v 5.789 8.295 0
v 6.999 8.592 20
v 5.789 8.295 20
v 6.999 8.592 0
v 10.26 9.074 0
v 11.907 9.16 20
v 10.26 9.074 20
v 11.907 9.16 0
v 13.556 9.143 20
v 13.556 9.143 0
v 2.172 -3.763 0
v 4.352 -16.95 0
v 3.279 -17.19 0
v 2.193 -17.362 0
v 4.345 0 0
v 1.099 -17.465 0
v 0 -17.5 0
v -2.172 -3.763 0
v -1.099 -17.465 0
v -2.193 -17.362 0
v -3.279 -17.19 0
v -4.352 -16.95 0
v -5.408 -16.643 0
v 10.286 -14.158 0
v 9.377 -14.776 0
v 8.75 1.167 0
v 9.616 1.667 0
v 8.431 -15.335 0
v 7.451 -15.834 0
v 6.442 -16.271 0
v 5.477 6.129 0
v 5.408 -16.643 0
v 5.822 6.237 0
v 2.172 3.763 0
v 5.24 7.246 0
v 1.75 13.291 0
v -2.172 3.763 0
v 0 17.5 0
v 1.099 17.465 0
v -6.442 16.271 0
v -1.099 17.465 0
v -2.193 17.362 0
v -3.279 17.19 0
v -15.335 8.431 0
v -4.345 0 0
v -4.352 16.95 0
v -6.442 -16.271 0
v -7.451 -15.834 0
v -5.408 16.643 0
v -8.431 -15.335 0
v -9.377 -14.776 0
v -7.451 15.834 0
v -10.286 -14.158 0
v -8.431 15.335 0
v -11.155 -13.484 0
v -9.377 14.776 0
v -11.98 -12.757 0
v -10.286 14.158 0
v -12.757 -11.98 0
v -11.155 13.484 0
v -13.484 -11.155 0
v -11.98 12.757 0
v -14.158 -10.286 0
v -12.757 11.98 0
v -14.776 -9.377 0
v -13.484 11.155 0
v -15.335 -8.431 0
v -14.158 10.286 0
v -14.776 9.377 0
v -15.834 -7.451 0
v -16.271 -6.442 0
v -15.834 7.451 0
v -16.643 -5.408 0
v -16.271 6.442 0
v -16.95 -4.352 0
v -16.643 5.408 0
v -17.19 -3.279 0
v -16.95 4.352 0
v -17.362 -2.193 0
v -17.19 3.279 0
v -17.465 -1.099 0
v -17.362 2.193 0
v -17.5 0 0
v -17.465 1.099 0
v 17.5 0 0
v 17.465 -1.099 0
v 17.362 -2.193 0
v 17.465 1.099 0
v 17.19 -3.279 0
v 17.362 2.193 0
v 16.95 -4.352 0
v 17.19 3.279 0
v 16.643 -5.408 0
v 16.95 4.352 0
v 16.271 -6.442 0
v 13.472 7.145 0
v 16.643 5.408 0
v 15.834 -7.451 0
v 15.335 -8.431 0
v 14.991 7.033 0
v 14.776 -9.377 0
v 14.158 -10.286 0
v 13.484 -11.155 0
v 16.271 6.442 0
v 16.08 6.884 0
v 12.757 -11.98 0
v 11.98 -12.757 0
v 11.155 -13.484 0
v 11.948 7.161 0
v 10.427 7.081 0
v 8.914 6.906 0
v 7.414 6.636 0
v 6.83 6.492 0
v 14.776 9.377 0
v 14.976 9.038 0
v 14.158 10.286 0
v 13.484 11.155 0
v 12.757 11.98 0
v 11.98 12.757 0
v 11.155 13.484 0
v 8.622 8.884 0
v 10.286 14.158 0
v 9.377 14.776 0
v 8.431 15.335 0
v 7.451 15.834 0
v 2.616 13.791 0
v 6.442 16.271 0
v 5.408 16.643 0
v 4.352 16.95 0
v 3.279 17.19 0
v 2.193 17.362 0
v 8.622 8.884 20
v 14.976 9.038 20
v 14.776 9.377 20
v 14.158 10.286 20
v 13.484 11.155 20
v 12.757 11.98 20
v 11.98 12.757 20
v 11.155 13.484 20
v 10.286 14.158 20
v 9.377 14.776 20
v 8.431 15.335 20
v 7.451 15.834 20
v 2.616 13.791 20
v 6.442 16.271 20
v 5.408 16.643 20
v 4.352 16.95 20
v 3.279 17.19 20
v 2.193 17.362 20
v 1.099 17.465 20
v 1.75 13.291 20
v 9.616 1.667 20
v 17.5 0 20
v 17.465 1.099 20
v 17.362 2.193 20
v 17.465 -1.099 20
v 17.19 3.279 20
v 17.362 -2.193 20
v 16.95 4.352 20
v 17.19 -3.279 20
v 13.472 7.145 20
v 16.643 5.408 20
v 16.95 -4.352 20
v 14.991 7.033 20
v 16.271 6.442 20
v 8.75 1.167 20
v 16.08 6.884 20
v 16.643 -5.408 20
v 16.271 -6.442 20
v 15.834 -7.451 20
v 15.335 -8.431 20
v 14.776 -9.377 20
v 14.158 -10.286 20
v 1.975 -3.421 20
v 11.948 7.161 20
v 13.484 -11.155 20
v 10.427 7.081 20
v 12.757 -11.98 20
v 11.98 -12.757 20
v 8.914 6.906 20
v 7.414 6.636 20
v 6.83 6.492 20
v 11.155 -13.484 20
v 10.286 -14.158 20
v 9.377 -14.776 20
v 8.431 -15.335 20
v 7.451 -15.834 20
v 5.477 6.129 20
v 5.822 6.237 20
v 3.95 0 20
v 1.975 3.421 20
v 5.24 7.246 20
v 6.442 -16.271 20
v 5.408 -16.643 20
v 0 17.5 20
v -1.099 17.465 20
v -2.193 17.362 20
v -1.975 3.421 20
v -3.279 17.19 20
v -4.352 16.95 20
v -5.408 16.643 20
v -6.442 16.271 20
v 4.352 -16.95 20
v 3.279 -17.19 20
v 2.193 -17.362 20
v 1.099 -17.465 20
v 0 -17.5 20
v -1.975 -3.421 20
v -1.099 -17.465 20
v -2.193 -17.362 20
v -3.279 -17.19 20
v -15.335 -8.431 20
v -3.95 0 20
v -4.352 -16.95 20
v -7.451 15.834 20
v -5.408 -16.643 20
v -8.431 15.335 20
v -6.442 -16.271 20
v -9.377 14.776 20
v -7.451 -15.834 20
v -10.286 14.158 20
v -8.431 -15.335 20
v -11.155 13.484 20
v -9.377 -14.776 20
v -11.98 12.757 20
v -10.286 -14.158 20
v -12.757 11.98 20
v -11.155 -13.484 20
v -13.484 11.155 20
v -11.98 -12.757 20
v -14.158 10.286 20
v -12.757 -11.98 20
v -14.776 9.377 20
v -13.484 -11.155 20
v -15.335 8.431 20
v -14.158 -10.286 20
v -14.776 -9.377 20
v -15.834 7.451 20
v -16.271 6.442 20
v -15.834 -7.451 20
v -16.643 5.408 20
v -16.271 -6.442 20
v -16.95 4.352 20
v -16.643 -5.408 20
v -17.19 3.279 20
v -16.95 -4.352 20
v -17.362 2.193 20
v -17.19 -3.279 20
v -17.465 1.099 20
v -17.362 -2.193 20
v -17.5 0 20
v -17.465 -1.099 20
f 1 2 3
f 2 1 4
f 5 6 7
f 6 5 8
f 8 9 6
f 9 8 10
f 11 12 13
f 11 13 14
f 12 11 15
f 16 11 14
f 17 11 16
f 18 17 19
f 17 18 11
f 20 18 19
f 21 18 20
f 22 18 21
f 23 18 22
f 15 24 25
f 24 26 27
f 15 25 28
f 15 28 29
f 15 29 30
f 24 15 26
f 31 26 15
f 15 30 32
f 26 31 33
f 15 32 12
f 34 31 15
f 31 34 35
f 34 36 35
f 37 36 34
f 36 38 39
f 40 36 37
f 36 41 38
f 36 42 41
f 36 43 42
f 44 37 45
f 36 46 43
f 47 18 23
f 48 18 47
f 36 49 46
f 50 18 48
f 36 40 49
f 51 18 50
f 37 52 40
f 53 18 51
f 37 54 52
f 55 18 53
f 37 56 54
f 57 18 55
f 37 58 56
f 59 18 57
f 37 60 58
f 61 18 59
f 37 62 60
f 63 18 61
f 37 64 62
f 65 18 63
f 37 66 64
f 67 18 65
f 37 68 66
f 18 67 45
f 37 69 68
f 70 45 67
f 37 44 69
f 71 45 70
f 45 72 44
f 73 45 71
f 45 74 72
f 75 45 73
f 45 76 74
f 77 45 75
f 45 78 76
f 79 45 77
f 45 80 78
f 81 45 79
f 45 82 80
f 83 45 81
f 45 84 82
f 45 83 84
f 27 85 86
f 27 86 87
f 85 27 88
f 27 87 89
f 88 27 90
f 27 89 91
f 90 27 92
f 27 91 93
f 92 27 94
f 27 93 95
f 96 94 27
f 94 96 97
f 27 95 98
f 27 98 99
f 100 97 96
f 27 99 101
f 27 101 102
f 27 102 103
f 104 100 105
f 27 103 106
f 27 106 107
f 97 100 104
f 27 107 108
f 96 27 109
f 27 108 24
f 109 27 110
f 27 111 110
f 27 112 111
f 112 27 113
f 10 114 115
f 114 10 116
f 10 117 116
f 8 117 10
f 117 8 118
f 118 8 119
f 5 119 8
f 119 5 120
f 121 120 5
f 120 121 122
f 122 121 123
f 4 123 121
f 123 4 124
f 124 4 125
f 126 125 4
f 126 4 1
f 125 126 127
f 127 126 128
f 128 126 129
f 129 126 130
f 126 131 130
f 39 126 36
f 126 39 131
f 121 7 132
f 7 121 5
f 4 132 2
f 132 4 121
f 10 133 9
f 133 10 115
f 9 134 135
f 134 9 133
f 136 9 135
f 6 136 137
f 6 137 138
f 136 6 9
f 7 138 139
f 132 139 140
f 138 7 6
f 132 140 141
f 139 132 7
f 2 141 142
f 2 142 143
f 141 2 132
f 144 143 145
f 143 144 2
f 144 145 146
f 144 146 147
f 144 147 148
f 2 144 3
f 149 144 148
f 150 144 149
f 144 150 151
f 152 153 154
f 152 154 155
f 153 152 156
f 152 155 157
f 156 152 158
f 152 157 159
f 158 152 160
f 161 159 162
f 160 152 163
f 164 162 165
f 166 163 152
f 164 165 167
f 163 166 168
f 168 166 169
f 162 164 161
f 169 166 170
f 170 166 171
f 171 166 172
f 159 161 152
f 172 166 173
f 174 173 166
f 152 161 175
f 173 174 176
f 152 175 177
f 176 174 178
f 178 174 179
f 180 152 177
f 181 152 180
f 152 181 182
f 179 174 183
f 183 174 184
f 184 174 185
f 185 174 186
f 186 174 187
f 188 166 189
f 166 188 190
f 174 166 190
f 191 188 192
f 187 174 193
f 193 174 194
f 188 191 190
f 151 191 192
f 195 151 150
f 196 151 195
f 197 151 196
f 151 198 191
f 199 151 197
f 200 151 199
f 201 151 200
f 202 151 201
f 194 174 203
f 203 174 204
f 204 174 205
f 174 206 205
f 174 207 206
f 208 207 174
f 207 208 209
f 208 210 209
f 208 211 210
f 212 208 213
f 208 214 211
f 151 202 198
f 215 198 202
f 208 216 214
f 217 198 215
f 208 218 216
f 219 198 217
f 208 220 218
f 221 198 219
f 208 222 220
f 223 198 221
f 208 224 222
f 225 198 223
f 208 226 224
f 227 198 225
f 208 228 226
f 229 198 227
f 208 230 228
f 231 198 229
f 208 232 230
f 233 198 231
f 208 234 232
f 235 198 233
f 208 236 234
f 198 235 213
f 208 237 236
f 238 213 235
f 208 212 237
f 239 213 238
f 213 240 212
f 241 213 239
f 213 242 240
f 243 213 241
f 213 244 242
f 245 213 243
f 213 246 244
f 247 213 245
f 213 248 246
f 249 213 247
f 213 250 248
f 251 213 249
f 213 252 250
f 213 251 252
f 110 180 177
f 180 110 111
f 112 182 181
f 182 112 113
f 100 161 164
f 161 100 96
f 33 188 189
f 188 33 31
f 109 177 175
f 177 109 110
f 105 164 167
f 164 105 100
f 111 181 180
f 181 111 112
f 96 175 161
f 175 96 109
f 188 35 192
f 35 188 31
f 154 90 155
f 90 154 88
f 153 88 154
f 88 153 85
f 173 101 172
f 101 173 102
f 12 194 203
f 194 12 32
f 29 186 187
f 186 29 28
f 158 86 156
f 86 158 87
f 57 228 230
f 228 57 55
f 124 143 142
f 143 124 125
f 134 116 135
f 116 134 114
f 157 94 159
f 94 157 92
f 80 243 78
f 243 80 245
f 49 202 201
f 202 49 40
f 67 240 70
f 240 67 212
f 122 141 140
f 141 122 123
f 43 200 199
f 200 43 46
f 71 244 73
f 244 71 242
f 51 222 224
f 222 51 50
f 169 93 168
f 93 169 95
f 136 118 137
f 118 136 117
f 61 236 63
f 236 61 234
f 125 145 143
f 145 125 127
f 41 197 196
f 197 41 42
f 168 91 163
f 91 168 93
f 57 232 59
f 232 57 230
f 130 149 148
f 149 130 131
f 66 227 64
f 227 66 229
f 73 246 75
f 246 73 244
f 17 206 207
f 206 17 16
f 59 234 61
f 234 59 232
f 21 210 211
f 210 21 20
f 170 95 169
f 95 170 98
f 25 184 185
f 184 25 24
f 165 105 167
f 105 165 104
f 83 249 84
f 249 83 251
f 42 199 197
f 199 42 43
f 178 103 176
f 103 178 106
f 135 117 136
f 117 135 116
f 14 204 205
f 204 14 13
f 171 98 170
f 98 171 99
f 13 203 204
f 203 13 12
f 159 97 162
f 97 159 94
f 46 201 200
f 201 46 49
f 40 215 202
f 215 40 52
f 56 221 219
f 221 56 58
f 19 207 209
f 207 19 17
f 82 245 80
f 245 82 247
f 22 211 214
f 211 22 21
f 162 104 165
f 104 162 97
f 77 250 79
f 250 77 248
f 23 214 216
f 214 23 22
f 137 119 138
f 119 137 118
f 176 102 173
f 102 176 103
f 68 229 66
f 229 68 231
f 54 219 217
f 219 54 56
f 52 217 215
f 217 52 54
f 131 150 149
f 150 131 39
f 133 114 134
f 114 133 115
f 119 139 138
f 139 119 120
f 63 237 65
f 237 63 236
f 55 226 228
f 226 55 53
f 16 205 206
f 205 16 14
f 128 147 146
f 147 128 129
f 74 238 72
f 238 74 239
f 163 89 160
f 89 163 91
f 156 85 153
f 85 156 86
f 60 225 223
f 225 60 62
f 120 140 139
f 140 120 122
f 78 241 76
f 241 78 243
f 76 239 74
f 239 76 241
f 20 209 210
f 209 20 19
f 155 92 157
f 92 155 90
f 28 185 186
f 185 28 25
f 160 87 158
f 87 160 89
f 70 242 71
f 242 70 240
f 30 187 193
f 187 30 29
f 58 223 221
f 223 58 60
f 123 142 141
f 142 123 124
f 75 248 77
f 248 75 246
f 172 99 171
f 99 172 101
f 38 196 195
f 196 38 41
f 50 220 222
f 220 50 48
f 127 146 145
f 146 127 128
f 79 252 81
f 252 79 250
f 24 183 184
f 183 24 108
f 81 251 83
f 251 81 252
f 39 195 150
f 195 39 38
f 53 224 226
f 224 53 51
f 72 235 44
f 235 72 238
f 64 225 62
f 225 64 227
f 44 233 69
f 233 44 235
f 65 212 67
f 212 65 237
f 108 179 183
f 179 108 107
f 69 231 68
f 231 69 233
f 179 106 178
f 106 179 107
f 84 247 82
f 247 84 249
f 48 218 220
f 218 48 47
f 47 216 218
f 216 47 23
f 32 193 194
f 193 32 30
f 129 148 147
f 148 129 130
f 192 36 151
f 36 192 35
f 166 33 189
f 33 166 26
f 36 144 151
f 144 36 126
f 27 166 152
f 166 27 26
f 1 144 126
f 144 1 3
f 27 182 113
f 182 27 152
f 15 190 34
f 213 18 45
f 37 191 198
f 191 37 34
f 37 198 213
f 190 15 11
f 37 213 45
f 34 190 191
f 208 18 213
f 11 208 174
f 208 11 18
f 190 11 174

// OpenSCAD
//Attach sanding paper with double sided tapes, tuck ends in the slot.

od=35;  //drum diameter, minimum 20 mm
 len=20; //drum length
 slotw=1; //inner slot width
outslot=2;  //outer slot width



module hex(r=15,h=10){
intersection() {
    cylinder(r=r,h, $fn=6);
    translate([0,0,h*.5-3])
    sphere(r*1.3);
}
}

module hex_hole(id=7.9,h=20,od=50){
//id=size of hex bit   
//tapered hole with 1.1 tmes taper    
difference(){
 hex(od/2,h);
 translate([0,0,0])
cylinder(r1=id/2*1.1,r2=id/2,h, $fn=6); 
    }
}




module hollow(od=25,id=20,l1=62){
 len=l1;

 translate([2,0,0])
 difference(){
    // union(){
   translate([0,0,0])
         cylinder(r=od/2,h=len, $fn=100); 
 translate([0,0,0]) cylinder(r=id/2,h=len, $fn=100); 
 }
 }
 
  module arc_hollow(slotw=2){
      rotate([0,0,12])
 intersection(){
 hollow(od*1.5,id=od*1.5-2*slotw,l1=len);
   translate([-0,0,0])cube(od);}
 }
 
 
 


 module drum(){
 difference(){
cylinder(r=od/2,h=len, $fn=100);
 
 translate([od*.3,-od/2,0]) arc_hollow(outslot);
     translate([od/4,od/30,0]) rotate([0,0,30])cube([slotw,od/2.5,20]);
     }
 }
 

 module sanding_drum(){
 intersection(){
drum();
 hex_hole(od=od*2);
}
 }
 
 sanding_drum();
